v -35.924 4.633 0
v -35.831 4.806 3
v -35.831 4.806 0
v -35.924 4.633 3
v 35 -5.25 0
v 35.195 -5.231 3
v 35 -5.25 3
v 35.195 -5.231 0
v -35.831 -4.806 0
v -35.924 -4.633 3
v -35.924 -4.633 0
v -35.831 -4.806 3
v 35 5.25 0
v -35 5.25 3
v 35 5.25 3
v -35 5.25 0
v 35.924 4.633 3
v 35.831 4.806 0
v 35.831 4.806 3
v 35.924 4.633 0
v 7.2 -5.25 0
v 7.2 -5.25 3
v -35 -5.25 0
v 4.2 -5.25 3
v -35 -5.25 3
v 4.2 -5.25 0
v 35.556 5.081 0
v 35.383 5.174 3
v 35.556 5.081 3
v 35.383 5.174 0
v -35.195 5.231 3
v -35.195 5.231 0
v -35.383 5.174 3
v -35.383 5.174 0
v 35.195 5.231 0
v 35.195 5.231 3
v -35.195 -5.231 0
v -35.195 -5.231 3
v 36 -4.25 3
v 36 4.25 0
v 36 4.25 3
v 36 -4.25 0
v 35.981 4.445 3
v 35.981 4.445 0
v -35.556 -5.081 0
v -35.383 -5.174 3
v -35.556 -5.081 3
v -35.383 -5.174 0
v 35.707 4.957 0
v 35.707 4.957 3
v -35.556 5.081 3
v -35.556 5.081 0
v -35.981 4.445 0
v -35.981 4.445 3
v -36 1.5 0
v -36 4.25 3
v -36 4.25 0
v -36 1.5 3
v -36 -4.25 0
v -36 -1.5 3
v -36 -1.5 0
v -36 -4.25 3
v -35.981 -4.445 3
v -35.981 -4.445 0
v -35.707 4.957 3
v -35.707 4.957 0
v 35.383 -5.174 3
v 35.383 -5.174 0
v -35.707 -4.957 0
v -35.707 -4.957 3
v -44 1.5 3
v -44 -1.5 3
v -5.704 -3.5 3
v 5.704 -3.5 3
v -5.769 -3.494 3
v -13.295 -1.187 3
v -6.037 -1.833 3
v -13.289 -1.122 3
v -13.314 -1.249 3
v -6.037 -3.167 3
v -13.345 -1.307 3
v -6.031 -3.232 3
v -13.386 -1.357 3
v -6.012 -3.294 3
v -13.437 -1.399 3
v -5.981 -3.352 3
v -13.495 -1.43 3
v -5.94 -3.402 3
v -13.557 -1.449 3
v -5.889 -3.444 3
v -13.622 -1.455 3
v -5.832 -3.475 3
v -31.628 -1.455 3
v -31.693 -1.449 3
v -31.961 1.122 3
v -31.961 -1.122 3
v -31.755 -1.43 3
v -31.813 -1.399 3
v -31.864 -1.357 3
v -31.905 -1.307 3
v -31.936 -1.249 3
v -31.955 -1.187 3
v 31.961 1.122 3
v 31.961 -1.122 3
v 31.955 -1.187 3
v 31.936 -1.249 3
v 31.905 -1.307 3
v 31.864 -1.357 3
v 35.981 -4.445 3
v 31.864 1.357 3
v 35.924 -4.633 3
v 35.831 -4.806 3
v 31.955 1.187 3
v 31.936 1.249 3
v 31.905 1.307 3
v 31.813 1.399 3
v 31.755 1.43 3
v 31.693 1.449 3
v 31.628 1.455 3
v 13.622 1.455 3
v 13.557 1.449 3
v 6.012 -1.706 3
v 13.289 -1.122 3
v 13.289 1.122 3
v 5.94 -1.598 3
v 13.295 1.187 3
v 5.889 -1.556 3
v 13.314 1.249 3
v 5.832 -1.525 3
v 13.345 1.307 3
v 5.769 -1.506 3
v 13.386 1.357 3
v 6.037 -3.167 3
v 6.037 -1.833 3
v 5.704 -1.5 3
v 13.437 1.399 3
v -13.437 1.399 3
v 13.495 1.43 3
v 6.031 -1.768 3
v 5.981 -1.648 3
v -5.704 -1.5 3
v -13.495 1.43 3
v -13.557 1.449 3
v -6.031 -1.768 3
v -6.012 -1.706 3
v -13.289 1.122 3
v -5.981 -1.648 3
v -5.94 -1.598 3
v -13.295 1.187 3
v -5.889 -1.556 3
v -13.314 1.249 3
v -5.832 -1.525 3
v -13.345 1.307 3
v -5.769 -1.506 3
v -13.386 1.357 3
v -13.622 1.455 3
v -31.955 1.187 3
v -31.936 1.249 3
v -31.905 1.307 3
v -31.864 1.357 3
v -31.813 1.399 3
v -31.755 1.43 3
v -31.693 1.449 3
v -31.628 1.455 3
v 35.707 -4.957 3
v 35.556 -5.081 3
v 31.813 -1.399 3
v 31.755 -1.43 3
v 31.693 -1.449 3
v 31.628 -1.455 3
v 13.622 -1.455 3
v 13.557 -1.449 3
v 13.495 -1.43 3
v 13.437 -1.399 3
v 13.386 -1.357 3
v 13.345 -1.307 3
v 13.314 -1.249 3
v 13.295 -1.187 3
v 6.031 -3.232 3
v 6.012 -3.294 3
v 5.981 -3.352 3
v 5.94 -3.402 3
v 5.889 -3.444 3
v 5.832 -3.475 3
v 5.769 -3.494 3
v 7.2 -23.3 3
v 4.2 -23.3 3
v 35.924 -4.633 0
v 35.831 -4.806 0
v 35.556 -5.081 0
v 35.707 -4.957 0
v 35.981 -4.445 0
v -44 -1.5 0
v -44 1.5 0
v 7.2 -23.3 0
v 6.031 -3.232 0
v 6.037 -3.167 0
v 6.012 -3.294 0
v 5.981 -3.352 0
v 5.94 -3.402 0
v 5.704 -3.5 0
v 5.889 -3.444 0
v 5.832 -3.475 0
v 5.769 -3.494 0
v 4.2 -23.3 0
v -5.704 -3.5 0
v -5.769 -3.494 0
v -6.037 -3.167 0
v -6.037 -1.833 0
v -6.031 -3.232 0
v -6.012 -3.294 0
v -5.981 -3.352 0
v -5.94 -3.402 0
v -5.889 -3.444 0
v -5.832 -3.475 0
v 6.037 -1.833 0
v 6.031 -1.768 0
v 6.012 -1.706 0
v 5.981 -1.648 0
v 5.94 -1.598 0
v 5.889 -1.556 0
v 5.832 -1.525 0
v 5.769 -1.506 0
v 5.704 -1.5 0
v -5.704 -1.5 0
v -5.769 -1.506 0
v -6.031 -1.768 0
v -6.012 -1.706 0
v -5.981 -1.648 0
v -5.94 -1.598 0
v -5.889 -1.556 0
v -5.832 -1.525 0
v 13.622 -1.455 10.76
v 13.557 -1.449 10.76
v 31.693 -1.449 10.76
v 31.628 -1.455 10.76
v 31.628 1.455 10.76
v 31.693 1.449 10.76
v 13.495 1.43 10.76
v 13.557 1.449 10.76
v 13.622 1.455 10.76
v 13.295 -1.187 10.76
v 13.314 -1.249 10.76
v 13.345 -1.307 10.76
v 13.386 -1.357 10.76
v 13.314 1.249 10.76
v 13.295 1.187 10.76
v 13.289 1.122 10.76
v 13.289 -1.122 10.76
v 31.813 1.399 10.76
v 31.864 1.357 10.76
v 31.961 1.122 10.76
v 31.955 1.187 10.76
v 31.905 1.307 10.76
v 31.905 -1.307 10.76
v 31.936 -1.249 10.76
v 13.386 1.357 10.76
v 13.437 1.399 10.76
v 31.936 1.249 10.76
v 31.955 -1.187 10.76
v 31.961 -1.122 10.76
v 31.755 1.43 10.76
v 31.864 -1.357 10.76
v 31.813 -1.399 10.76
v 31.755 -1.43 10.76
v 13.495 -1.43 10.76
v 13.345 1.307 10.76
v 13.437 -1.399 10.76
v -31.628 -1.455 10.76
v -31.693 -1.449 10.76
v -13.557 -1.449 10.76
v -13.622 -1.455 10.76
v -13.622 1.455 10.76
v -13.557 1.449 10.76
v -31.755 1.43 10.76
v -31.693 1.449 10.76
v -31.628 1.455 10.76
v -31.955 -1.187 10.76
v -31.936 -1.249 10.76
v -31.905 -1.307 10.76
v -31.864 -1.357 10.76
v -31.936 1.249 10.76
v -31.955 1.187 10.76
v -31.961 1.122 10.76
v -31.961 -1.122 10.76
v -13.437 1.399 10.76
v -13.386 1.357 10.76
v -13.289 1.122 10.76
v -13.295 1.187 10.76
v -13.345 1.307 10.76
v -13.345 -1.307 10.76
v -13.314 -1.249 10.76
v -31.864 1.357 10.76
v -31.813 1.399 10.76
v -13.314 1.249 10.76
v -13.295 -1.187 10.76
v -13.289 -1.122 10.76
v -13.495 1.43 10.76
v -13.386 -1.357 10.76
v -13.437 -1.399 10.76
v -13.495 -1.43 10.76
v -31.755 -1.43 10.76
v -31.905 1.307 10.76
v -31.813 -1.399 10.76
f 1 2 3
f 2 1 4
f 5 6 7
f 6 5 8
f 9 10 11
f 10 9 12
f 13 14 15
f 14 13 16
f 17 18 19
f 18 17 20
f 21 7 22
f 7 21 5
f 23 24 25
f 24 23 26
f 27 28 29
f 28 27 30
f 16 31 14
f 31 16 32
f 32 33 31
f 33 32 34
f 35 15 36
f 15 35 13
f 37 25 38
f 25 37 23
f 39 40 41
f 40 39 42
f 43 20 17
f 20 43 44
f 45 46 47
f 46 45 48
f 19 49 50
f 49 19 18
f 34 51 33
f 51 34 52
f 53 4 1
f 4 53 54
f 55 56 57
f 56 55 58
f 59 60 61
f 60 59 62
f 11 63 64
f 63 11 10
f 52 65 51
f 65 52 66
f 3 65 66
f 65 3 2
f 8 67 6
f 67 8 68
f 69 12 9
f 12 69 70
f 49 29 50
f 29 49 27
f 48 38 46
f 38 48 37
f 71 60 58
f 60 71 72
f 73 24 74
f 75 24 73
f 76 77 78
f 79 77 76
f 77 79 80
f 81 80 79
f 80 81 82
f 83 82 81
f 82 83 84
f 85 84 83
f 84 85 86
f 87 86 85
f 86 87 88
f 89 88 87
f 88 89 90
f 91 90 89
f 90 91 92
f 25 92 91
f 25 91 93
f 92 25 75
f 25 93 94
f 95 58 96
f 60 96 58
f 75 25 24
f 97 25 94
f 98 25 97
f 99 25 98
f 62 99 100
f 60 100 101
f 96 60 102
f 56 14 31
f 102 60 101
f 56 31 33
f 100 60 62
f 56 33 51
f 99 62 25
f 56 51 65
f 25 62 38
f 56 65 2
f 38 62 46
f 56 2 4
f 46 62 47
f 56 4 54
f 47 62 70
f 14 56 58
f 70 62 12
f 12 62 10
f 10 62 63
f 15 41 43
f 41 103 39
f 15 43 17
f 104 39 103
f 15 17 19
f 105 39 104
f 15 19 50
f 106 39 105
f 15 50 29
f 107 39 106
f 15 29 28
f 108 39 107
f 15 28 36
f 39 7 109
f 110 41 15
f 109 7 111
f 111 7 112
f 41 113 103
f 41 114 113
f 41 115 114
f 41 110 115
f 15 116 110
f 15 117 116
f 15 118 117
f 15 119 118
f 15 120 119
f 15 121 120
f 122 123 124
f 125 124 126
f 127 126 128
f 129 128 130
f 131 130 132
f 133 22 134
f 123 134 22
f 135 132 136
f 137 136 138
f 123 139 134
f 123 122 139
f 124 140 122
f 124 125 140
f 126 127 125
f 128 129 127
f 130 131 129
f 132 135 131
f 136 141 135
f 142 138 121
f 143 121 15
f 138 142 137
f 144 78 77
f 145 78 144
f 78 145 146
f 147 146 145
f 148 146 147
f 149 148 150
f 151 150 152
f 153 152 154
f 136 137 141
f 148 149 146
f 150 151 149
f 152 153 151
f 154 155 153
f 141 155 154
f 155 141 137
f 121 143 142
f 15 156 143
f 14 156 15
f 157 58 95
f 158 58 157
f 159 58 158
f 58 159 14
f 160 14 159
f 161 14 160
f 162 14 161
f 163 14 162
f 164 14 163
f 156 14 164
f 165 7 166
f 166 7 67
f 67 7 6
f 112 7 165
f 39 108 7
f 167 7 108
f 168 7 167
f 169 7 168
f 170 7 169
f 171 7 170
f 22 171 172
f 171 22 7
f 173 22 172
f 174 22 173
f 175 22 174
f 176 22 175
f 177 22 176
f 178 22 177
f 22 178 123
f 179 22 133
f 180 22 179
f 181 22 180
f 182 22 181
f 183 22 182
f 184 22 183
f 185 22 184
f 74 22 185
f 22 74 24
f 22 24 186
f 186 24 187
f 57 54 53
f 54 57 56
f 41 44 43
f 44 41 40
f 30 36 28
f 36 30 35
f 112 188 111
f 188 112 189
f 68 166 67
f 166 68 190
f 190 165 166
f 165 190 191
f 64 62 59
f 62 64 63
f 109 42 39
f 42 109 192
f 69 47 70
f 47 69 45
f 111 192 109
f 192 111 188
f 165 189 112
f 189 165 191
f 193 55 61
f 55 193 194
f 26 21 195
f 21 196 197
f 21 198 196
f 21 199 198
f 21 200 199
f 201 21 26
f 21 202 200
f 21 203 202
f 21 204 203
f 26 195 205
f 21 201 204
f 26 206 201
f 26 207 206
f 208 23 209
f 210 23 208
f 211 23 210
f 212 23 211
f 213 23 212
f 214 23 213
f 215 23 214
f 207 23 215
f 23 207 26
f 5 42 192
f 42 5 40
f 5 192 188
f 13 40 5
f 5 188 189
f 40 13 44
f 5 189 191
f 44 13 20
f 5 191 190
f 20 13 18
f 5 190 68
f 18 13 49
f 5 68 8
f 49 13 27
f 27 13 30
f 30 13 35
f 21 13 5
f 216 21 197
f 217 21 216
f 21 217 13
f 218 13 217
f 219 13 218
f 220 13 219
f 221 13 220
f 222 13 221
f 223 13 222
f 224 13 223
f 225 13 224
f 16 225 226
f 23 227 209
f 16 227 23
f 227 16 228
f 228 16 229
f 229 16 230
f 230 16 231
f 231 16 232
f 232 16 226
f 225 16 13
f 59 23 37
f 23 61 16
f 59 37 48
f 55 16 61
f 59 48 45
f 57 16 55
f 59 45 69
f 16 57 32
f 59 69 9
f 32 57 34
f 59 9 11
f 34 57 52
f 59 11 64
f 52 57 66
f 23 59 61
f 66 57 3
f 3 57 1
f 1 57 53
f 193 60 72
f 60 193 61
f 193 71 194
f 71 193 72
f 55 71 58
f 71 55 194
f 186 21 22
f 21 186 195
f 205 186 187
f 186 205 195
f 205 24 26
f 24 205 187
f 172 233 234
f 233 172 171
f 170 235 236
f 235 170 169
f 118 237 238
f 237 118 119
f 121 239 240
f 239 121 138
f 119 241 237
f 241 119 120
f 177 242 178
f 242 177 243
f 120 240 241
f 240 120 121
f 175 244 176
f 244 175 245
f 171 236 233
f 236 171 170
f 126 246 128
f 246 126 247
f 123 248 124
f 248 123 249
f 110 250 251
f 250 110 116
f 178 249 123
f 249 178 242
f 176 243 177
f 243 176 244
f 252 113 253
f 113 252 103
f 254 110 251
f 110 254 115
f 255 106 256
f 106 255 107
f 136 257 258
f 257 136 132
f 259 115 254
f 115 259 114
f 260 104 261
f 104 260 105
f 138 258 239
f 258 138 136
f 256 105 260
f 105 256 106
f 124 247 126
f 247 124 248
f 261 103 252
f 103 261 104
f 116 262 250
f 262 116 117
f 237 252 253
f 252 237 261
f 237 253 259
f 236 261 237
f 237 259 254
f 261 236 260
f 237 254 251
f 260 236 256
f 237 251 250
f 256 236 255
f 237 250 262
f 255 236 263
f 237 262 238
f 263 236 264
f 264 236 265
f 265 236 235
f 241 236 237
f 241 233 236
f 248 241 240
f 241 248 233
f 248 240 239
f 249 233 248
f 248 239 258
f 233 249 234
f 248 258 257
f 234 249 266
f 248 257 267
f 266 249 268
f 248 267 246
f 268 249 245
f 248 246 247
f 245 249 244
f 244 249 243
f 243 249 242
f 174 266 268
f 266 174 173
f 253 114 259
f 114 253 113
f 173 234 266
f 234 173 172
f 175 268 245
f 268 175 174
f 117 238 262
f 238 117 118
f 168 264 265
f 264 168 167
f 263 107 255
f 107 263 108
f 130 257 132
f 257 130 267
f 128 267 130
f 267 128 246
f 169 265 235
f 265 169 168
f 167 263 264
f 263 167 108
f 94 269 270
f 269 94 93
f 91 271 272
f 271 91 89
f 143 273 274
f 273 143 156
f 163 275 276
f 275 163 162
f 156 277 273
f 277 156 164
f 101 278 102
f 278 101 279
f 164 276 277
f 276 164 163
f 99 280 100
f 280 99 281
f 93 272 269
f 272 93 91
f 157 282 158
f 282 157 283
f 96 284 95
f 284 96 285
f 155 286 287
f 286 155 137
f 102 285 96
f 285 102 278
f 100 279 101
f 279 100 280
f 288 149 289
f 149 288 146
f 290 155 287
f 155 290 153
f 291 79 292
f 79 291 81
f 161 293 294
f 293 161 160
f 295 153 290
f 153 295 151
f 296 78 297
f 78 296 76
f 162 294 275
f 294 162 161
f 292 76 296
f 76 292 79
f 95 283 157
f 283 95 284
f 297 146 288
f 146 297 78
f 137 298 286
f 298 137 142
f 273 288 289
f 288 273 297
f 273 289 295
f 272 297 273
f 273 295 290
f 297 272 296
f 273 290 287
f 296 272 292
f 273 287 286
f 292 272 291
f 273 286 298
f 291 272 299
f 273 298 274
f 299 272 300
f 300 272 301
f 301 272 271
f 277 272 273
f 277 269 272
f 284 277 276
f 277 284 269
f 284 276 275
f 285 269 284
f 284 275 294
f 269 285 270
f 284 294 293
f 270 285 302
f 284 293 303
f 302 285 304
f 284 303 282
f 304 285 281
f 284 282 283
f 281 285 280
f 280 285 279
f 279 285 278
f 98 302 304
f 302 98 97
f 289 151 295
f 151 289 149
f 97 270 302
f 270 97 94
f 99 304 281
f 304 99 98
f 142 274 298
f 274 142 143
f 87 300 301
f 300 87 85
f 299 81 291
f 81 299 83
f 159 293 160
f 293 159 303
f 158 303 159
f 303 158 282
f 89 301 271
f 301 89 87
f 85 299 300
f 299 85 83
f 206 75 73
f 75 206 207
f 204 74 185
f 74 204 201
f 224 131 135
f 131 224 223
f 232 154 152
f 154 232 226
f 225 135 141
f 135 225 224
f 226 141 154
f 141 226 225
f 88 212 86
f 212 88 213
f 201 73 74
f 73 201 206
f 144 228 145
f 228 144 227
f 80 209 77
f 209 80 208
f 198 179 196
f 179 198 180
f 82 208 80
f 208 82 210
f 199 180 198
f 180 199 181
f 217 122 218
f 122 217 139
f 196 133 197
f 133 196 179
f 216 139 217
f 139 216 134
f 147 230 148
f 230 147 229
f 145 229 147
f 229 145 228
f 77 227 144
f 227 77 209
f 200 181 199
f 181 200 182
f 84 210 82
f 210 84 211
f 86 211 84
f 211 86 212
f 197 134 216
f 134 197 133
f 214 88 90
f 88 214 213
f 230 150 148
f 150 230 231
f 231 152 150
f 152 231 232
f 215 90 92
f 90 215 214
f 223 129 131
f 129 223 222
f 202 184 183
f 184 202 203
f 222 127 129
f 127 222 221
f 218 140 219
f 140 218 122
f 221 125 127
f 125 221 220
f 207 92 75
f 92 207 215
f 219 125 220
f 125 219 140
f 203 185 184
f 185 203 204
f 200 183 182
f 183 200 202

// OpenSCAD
// file: rounded.scad
//
// Copyright (c) Stewart H. Whitman, 2020-2022.
//
// File:    rounded.scad
// Project: General
// License: CC BY-NC-SA 4.0 (Attribution-NonCommercial-ShareAlike)
// Desc:    Rounded square/cube/cylinder utilities
//

// rounded_side_square:
//
// Generate a square of <size> with a round-over <radius> in
// the X/Y direction. Centered optionally like a square.
//
module rounded_side_square( size, radius, center=false ) {
  assert( is_num(size) || is_list(size) );
  assert( is_num(radius) && radius >= 0 );

  c = is_list(size) ? size : [size,size];

  assert( len(c) == 2 );
  assert( is_num(c.x) );
  assert( is_num(c.y) );
  assert( c.x > 2*radius );
  assert( c.y > 2*radius );

  offset( r=radius )
    offset( delta=-radius )
      square( c, center=center );
} // end rounded_side_square

// rounded_side_cube:
//
// Generate a cube of <size> with a round-over <radius> in
// the X/Y direction. Centered optionally like a cube.
//
module rounded_side_cube( size, radius, center=false ) {
  assert( is_num(size) || is_list(size) );

  c = is_list(size) ? size : [size,size,size];

  assert( len(c) == 3 );
  assert( is_num(c.z) );

  linear_extrude( height=c.z, center=center )
    rounded_side_square( [c.x,c.y], radius, center );
} // end rounded_side_cube

// rounded_side_cube_upper:
//
// Generate a cube of <size> with a round-over <radius> in
// the X/Y direction. The object is centered on X/Y but with
// Z positive.
//
module rounded_side_cube_upper( size, radius ) {
  assert( is_num(size) || is_list(size) );

  c = is_list(size) ? size : [size,size,size];

  assert( len(c) == 3 );
  assert( is_num(c.z) );

  linear_extrude( height=c.z )
    rounded_side_square( [c.x,c.y], radius, true );
} // end rounded_side_cube_upper

// rounded_top_cylinder:
//
// Generate a cylinder with a rounded top, with <d,r,h> parameters
// like cylinder, but <radius> defines the round-over radius.
//
module rounded_top_cylinder(h,d,r,radius,center=false) {
  assert( is_num(h) && h > 0 );
  assert( (is_undef(r) || is_undef(d)) && (is_num(r) || is_num(d)) ); // Not both
  assert( is_num(radius) );
  assert( h > radius );

  cylinder_radius = is_undef(d) ? r : d/2;
  assert( cylinder_radius > radius );

  translate( [0,0,(center?-h/2:0)] )
    rotate_extrude()
      intersection() {
        offset( r=+radius ) offset( delta=-radius ) square( [ 2*cylinder_radius, 2*h ], center=true );
        square( [cylinder_radius,h] );
      }
} // end rounded_top_cylinder

// rounded_top_and_bottom_cylinder:
//
// Generate a cylinder with a rounded top and bottom, with <d,r,h> parameters
// like cylinder, but <radius> defines the round-over radius.
//
module rounded_top_and_bottom_cylinder(h,d,r,radius,center=false) {
  assert( is_num(h) && h > 0 );
  assert( (is_undef(r) || is_undef(d)) && (is_num(r) || is_num(d)) ); // Not both
  assert( is_num(radius) );
  assert( h > radius );

  cylinder_radius = is_undef(d) ? r : d/2;
  assert( cylinder_radius > radius );

  translate( [0,0,(center?-h/2:0)] )
    rotate_extrude()
      intersection() {
        translate( [-cylinder_radius, 0 ] ) offset( r=+radius ) offset( delta=-radius ) square( [ 2*cylinder_radius, h ], center=false );
	square( [cylinder_radius,h] );
      }
} // end rounded_top_and_bottom_cylinder

// rounded_top_cube:
//
// Generate a cube of <size> with a top with a round-over <radius> in
// the X/Y/Z direction. Centered optionally like a cube.
//
module rounded_top_cube(size,radius,center=false) {
  assert( is_num(size) || is_list(size) );
  assert( is_num(radius) && radius >= 0 );

  size_v = is_list(size) ? size : [size,size,size];

  rounded_top_volume( size_v, radius, center ? [0,0,0] : size_v/2 ) cube(size_v,center=center);
} // end rounded_top_cube

// rounded_top_volume:
//
// Operates on its children creating a round over effect based
// on percentage of height. Operations are:
//    1. Translate volume from <c> to origin
//    2. Scale X/Y volume down based-on the radius to be added in step 3
//    3. Minkowski with sphere adding 2*radius in all dimensions
//    4. Remove rounded over bottom radius:
//     a. Translate down a radius
//     b. Intersect with full volume
//    5. Restore volume to <c>
//
module rounded_top_volume(volume,radius,c=[0,0,0]) {
  assert( is_num(radius) && radius >= 0 );
  assert( is_list(volume) && len(volume) == 3 );
  assert( volume.x > 2*radius );
  assert( volume.y > 2*radius );

  if( radius > 0 ) {
    delta        = volume - [2*radius, 2*radius, 0];
    scale_factor = [delta.x/volume.x, delta.y/volume.y, 1 ];

    translate(c) intersection() {
      cube( volume, center=true );
      translate([0, 0, -radius ] ) minkowski() {
	scale( scale_factor ) translate(-c) children();
	sphere( r=radius );
      }
    }
  }
  else
    children();
} // end rounded_top_volume
// file: smidge.scad
//
// Copyright (c) Stewart H. Whitman, 2021-2022.
//
// File:    smidge.scad
// Project: General
// License: CC BY-NC-SA 4.0 (Attribution-NonCommercial-ShareAlike)
// Desc:    SMIDGE constant used in preview mode.
//

// Smidge constant for rendering only (to avoid Z-axis fighting, etc.)
SMIDGE = 0.01;
// main file
//
// Copyright (c) Stewart H. Whitman, 2022.
//
// File:    hp-z4-catch-bottom.scad
// Project: HP Z4 G4 Fan Mount
// License: CC BY-NC-SA 4.0 (Attribution-NonCommercial-ShareAlike)
// Desc:    HP Z4 G4 Bottom Front Fan Cage Catch Definitions
//

include <smidge.scad>;
include <rounded.scad>;

// Catch:
//
// Catch refers to the top area of the "mound". Radius
// is nominal.
//
// bottom_catch_size: length, width
bottom_catch_size = [ 72, 10.5 ];
bottom_catch_radius = 1;

// Slot:
//
// Two slots, centered atop the long axis and positioned
// symmetrically about the vertical center. Depth is space
// below mount.
//
// bottom_slot_size: length, width, depth
bottom_slot_size = [ 19.25, 3, 8 ];
bottom_slot_separation = 26;
bottom_slot_centers = (bottom_slot_separation + bottom_slot_size.x)/2 * [ [ 1, 0 ], [ -1, 0 ] ];

// Tab:
//
// Tab is finished with metal folded over so it
// is wider at the bottom than the top. Thickness
// is nominal (but not insignificant because of the
// folds). Positioned at the center of long axis, but,
// pushed to the side of the slots so that it forms
// a mating surface.
//
// tab_size: length at bottom, thickness, height
bottom_tab_size = [ 11.5, 1.5, 11.5 ];
bottom_tab_width_at_top = 9;
bottom_tab_center = [ 0, -bottom_slot_size.y/2 ];

// Fitting (tolerance) properties:
//
bottom_tang_multiplier = 0.97;
bottom_tang_slant_scale = [ 0.9, 0.8 ];
bottom_tab_multiplier = 1.05;
bottom_tab_width_overage = 2.0;

// bottom_catch_tang:
//
// The tangs are inserted it the slots of catch on the machine.
//
module bottom_catch_tang( style ) {
  // Overall size of the tang
  size = [ bottom_tang_multiplier * bottom_slot_size.x, bottom_tang_multiplier * bottom_slot_size.y, (style == "full") ? bottom_tang_multiplier * bottom_slot_size.z : 0.9*bottom_slot_size.z ];

  if( style == "none" ) {
    ;
  }
  // debug: just cubes (for debugging)
  else if( style == "debug" ) {
    rounded_side_cube_upper( bottom_slot_size, radius=0 );
  }
  // full: straight just scaled by percentage (for fitting)
  else if( style == "full" ) {
    rounded_side_cube_upper( size, bottom_catch_radius/3);
  }
  // slant: slanted on 4-sides
  // complex: straight for a little, then slanted on 4-sides
  else if( style == "slant" || style == "complex" ) {
    complex_straight_height = (style == "complex") ? 2.0 : 0;
    assert( size.z > complex_straight_height );

    if( complex_straight_height > 0 )
      rounded_side_cube_upper( [size.x,size.y,complex_straight_height], bottom_catch_radius/3);

    translate( [ 0, 0, complex_straight_height] )
      linear_extrude( height = size.z-complex_straight_height, scale=bottom_tang_slant_scale )
	rounded_side_square( [size.x,size.y], bottom_catch_radius/3, center=true );
  }
  else {
    assert( false, "bottom_catch_tang: style unknown!" );
  }
} // end bottom_catch_tang

// bottom_catch_bottom_tab_deletion:
//
// The machine's vertical tab is inserted into this tab cutout.
//
module bottom_catch_bottom_tab_deletion( style, height ) {
  size = bottom_tab_multiplier * bottom_tab_size;

  // debug: just cubes (for debugging)
  if( style == "debug" ) {
    rounded_side_cube_upper( bottom_tab_size, radius=0 );
  }
  else if( style == "none" || height <= 0 ) {
    ;
  }
  // full: fully cutout
  else if( style == "full" ) {
    width = bottom_catch_size.x;
    translate( concat( bottom_tab_center - [0,width/2], -SMIDGE ) )
      rounded_side_cube_upper( [ size.x, width, size.z+2*SMIDGE ], bottom_catch_radius/3 );
  }
  // hole: a hole
  else if( style == "hole" ) {
    width = bottom_tab_width_overage;
    translate( concat( bottom_tab_center - [0,width/2], -SMIDGE ) )
      rounded_side_cube_upper( [ size.x, width, size.z+2*SMIDGE ], bottom_catch_radius/3 );
  }
  // tapered-hole: a hole with a taper in width direction
  else if( style == "tapered-hole" ) {
    width        = bottom_tab_width_overage;
    scale_factor = 0.85;

    translate( concat( bottom_tab_center - [0,width/2], -SMIDGE ) )
      linear_extrude( height = size.z+2*SMIDGE, scale=[ 1/scale_factor, 1.0] )
	rounded_side_square( [ size.x * scale_factor, width ], bottom_catch_radius/3, center=true );
  }
  // flared-hole: a hole with a taper in both directions
  else if( style == "flared-hole" ) {
    width        = bottom_tab_width_overage;
    scale_factor = 0.85;

    translate( concat( bottom_tab_center - [0,width/2], -SMIDGE ) )
      linear_extrude( height = size.z+2*SMIDGE, scale=[ 1/scale_factor, 1.0 ] )
        rounded_side_square( [ size.x * scale_factor, width ], bottom_catch_radius/3, center=true );

    // Flare wider at near tab entry point
    flare_height = size.z/3;
    flare_factor = 2.0;
    flare_start_size_x = size.x - size.x * (1 - scale_factor) * (flare_height / size.z);

    translate( concat( bottom_tab_center - [0,width/2], size.z-flare_height-SMIDGE ) )
      linear_extrude( height = flare_height+2*SMIDGE, scale=[ 1/scale_factor, flare_factor] )
        rounded_side_square( [ flare_start_size_x, width ], bottom_catch_radius/3, center=true );
  }
  else {
    assert( false, "bottom_catch_bottom_tab_deletion: style unknown!" );
  }
} // end bottom_catch_bottom_tab_deletion

// bottom_catch_base:
//
// The catch structure matches the machine's catch surface
//
module bottom_catch_base( style, height, width ) {
  size = [ bottom_catch_size.x, width, height ];

  if( style == "none" || height <= 0 || width <= 0 ) {
    ;
  }
  // full: straight just scaled by percentage
  else if( style == "full" ) {
    rounded_side_cube_upper( size, bottom_catch_radius );
  }
  // layout: test layout the distance to cage / front
  else if( style == "layout" ) {
    rounded_side_cube_upper( size, bottom_catch_radius );

    // Side prong to cage
    {
      catch_center_to_cage = 44;
      translate( [-catch_center_to_cage/2,0,0] )
	rounded_side_cube_upper( [catch_center_to_cage, 3, size.z], 0 );
    }
    // Rear prong to top catch layout dropdown
    {
      // to meet up with top catch layout distance actual built base height top catch
      catch_center_to_front = (26.0 + 3.25) - (3.25 + 2.7);
      catch_center_to_mid   = -5.7;
      translate( [-catch_center_to_mid,-catch_center_to_front/2,0] )
	rounded_side_cube_upper( [3, catch_center_to_front, size.z], 0 );
    }
  }
  // sloped: sides are sloped at 45 degrees
  else if( style == "sloped" ) {
    front_angle = 45;
    front_expansion = sin(front_angle)*size.z;

    expanded_size = [ size.x, size.y ] + 2*[front_expansion,front_expansion];
    linear_extrude( height=size.z, scale = [ size.x/expanded_size.x, size.y/expanded_size.y ]  )
      rounded_side_square( expanded_size, radius, center=true );
  }
  // trap-both:
  else if( style == "trap-both" ) {
    assert( size.y >= bottom_catch_size.y );

    expanded_size = [ size.x, size.y ];
    linear_extrude( height=size.z, scale = [ bottom_catch_size.x/expanded_size.x, bottom_catch_size.y/expanded_size.y ]  )
      rounded_side_square( expanded_size, bottom_catch_radius, center=true );
  }
  // trap-front:
  else if( style == "trap-front" ) {
    assert( size.y >= bottom_catch_size.y );

    delta = (size.y-bottom_catch_size.y)/2;

    intersection() {
      translate( [0,+delta/2,0] )
	rounded_side_cube_upper( size - [ 0, delta, 0 ], bottom_catch_radius );

      expanded_size = [size.x, size.y];
      linear_extrude( height=size.z, scale = [ bottom_catch_size.x/expanded_size.x, bottom_catch_size.y/expanded_size.y ]  )
	rounded_side_square( expanded_size, bottom_catch_radius, center=true );
     }
  }
  else {
    assert( false, "bottom_catch_base: style unknown!" );
  }
} // end bottom_catch_base

// bottom_catch_fitting:
//
// Generate a mate to the machine's catch.
//
module bottom_catch_fitting( height=3, width=bottom_catch_size.y, base_style="full", tang_style="slant", tab_style="full" ) {
  assert( is_num(height) && height >= 0 );
  assert( is_num(width) && width >= 0 );

  difference() {
    union() {
      // Base
      bottom_catch_base( base_style, height, width );

      // Slot projection
      for( p = bottom_slot_centers )
        translate( concat( p, height ) )
          bottom_catch_tang( tang_style );

      // Tab debug means show tab
      if( tab_style == "debug" )
	translate( concat( bottom_tab_center, -bottom_tab_size.z  ) )
	  bottom_catch_bottom_tab_deletion( tab_style, height );
    }

    // Tab cutout deletion (except for debug)
    if( tab_style != "debug" )
      bottom_catch_bottom_tab_deletion( tab_style, height );
  }
} // end bottom_catch_fitting

// bottom_catch_get_size, bottom_catch_get_above_size, bottom_catch_get_below_size:
//
// Returns [ length, width, height above/below case level ]
//
function bottom_catch_get_size()       = concat( bottom_catch_size, bottom_tab_size.z+bottom_slot_size.z );
function bottom_catch_get_above_size() = concat( bottom_catch_size, bottom_tab_size.z );
function bottom_catch_get_below_size() = concat( bottom_catch_size, bottom_slot_size.z );

$fn = 32;
//bottom_catch_fitting(height=3,base_style="full",tang_style="full", tab_style="hole");
//bottom_catch_fitting(height=2.4,base_style="full",tang_style="complex", tab_style="tapered-hole");
//bottom_catch_fitting(height=bottom_tab_size.z, width=30, base_style="trap-front", tang_style="complex", tab_style="tapered-hole");
//bottom_catch_fitting(height=0, base_style="full", tang_style="debug", tab_style="debug");
//bottom_catch_fitting(height=bottom_tab_size.z, width=30, base_style="trap-front", tang_style="complex", tab_style="flared-hole");
bottom_catch_fitting(height=3,base_style="layout",tang_style="full", tab_style="hole");
